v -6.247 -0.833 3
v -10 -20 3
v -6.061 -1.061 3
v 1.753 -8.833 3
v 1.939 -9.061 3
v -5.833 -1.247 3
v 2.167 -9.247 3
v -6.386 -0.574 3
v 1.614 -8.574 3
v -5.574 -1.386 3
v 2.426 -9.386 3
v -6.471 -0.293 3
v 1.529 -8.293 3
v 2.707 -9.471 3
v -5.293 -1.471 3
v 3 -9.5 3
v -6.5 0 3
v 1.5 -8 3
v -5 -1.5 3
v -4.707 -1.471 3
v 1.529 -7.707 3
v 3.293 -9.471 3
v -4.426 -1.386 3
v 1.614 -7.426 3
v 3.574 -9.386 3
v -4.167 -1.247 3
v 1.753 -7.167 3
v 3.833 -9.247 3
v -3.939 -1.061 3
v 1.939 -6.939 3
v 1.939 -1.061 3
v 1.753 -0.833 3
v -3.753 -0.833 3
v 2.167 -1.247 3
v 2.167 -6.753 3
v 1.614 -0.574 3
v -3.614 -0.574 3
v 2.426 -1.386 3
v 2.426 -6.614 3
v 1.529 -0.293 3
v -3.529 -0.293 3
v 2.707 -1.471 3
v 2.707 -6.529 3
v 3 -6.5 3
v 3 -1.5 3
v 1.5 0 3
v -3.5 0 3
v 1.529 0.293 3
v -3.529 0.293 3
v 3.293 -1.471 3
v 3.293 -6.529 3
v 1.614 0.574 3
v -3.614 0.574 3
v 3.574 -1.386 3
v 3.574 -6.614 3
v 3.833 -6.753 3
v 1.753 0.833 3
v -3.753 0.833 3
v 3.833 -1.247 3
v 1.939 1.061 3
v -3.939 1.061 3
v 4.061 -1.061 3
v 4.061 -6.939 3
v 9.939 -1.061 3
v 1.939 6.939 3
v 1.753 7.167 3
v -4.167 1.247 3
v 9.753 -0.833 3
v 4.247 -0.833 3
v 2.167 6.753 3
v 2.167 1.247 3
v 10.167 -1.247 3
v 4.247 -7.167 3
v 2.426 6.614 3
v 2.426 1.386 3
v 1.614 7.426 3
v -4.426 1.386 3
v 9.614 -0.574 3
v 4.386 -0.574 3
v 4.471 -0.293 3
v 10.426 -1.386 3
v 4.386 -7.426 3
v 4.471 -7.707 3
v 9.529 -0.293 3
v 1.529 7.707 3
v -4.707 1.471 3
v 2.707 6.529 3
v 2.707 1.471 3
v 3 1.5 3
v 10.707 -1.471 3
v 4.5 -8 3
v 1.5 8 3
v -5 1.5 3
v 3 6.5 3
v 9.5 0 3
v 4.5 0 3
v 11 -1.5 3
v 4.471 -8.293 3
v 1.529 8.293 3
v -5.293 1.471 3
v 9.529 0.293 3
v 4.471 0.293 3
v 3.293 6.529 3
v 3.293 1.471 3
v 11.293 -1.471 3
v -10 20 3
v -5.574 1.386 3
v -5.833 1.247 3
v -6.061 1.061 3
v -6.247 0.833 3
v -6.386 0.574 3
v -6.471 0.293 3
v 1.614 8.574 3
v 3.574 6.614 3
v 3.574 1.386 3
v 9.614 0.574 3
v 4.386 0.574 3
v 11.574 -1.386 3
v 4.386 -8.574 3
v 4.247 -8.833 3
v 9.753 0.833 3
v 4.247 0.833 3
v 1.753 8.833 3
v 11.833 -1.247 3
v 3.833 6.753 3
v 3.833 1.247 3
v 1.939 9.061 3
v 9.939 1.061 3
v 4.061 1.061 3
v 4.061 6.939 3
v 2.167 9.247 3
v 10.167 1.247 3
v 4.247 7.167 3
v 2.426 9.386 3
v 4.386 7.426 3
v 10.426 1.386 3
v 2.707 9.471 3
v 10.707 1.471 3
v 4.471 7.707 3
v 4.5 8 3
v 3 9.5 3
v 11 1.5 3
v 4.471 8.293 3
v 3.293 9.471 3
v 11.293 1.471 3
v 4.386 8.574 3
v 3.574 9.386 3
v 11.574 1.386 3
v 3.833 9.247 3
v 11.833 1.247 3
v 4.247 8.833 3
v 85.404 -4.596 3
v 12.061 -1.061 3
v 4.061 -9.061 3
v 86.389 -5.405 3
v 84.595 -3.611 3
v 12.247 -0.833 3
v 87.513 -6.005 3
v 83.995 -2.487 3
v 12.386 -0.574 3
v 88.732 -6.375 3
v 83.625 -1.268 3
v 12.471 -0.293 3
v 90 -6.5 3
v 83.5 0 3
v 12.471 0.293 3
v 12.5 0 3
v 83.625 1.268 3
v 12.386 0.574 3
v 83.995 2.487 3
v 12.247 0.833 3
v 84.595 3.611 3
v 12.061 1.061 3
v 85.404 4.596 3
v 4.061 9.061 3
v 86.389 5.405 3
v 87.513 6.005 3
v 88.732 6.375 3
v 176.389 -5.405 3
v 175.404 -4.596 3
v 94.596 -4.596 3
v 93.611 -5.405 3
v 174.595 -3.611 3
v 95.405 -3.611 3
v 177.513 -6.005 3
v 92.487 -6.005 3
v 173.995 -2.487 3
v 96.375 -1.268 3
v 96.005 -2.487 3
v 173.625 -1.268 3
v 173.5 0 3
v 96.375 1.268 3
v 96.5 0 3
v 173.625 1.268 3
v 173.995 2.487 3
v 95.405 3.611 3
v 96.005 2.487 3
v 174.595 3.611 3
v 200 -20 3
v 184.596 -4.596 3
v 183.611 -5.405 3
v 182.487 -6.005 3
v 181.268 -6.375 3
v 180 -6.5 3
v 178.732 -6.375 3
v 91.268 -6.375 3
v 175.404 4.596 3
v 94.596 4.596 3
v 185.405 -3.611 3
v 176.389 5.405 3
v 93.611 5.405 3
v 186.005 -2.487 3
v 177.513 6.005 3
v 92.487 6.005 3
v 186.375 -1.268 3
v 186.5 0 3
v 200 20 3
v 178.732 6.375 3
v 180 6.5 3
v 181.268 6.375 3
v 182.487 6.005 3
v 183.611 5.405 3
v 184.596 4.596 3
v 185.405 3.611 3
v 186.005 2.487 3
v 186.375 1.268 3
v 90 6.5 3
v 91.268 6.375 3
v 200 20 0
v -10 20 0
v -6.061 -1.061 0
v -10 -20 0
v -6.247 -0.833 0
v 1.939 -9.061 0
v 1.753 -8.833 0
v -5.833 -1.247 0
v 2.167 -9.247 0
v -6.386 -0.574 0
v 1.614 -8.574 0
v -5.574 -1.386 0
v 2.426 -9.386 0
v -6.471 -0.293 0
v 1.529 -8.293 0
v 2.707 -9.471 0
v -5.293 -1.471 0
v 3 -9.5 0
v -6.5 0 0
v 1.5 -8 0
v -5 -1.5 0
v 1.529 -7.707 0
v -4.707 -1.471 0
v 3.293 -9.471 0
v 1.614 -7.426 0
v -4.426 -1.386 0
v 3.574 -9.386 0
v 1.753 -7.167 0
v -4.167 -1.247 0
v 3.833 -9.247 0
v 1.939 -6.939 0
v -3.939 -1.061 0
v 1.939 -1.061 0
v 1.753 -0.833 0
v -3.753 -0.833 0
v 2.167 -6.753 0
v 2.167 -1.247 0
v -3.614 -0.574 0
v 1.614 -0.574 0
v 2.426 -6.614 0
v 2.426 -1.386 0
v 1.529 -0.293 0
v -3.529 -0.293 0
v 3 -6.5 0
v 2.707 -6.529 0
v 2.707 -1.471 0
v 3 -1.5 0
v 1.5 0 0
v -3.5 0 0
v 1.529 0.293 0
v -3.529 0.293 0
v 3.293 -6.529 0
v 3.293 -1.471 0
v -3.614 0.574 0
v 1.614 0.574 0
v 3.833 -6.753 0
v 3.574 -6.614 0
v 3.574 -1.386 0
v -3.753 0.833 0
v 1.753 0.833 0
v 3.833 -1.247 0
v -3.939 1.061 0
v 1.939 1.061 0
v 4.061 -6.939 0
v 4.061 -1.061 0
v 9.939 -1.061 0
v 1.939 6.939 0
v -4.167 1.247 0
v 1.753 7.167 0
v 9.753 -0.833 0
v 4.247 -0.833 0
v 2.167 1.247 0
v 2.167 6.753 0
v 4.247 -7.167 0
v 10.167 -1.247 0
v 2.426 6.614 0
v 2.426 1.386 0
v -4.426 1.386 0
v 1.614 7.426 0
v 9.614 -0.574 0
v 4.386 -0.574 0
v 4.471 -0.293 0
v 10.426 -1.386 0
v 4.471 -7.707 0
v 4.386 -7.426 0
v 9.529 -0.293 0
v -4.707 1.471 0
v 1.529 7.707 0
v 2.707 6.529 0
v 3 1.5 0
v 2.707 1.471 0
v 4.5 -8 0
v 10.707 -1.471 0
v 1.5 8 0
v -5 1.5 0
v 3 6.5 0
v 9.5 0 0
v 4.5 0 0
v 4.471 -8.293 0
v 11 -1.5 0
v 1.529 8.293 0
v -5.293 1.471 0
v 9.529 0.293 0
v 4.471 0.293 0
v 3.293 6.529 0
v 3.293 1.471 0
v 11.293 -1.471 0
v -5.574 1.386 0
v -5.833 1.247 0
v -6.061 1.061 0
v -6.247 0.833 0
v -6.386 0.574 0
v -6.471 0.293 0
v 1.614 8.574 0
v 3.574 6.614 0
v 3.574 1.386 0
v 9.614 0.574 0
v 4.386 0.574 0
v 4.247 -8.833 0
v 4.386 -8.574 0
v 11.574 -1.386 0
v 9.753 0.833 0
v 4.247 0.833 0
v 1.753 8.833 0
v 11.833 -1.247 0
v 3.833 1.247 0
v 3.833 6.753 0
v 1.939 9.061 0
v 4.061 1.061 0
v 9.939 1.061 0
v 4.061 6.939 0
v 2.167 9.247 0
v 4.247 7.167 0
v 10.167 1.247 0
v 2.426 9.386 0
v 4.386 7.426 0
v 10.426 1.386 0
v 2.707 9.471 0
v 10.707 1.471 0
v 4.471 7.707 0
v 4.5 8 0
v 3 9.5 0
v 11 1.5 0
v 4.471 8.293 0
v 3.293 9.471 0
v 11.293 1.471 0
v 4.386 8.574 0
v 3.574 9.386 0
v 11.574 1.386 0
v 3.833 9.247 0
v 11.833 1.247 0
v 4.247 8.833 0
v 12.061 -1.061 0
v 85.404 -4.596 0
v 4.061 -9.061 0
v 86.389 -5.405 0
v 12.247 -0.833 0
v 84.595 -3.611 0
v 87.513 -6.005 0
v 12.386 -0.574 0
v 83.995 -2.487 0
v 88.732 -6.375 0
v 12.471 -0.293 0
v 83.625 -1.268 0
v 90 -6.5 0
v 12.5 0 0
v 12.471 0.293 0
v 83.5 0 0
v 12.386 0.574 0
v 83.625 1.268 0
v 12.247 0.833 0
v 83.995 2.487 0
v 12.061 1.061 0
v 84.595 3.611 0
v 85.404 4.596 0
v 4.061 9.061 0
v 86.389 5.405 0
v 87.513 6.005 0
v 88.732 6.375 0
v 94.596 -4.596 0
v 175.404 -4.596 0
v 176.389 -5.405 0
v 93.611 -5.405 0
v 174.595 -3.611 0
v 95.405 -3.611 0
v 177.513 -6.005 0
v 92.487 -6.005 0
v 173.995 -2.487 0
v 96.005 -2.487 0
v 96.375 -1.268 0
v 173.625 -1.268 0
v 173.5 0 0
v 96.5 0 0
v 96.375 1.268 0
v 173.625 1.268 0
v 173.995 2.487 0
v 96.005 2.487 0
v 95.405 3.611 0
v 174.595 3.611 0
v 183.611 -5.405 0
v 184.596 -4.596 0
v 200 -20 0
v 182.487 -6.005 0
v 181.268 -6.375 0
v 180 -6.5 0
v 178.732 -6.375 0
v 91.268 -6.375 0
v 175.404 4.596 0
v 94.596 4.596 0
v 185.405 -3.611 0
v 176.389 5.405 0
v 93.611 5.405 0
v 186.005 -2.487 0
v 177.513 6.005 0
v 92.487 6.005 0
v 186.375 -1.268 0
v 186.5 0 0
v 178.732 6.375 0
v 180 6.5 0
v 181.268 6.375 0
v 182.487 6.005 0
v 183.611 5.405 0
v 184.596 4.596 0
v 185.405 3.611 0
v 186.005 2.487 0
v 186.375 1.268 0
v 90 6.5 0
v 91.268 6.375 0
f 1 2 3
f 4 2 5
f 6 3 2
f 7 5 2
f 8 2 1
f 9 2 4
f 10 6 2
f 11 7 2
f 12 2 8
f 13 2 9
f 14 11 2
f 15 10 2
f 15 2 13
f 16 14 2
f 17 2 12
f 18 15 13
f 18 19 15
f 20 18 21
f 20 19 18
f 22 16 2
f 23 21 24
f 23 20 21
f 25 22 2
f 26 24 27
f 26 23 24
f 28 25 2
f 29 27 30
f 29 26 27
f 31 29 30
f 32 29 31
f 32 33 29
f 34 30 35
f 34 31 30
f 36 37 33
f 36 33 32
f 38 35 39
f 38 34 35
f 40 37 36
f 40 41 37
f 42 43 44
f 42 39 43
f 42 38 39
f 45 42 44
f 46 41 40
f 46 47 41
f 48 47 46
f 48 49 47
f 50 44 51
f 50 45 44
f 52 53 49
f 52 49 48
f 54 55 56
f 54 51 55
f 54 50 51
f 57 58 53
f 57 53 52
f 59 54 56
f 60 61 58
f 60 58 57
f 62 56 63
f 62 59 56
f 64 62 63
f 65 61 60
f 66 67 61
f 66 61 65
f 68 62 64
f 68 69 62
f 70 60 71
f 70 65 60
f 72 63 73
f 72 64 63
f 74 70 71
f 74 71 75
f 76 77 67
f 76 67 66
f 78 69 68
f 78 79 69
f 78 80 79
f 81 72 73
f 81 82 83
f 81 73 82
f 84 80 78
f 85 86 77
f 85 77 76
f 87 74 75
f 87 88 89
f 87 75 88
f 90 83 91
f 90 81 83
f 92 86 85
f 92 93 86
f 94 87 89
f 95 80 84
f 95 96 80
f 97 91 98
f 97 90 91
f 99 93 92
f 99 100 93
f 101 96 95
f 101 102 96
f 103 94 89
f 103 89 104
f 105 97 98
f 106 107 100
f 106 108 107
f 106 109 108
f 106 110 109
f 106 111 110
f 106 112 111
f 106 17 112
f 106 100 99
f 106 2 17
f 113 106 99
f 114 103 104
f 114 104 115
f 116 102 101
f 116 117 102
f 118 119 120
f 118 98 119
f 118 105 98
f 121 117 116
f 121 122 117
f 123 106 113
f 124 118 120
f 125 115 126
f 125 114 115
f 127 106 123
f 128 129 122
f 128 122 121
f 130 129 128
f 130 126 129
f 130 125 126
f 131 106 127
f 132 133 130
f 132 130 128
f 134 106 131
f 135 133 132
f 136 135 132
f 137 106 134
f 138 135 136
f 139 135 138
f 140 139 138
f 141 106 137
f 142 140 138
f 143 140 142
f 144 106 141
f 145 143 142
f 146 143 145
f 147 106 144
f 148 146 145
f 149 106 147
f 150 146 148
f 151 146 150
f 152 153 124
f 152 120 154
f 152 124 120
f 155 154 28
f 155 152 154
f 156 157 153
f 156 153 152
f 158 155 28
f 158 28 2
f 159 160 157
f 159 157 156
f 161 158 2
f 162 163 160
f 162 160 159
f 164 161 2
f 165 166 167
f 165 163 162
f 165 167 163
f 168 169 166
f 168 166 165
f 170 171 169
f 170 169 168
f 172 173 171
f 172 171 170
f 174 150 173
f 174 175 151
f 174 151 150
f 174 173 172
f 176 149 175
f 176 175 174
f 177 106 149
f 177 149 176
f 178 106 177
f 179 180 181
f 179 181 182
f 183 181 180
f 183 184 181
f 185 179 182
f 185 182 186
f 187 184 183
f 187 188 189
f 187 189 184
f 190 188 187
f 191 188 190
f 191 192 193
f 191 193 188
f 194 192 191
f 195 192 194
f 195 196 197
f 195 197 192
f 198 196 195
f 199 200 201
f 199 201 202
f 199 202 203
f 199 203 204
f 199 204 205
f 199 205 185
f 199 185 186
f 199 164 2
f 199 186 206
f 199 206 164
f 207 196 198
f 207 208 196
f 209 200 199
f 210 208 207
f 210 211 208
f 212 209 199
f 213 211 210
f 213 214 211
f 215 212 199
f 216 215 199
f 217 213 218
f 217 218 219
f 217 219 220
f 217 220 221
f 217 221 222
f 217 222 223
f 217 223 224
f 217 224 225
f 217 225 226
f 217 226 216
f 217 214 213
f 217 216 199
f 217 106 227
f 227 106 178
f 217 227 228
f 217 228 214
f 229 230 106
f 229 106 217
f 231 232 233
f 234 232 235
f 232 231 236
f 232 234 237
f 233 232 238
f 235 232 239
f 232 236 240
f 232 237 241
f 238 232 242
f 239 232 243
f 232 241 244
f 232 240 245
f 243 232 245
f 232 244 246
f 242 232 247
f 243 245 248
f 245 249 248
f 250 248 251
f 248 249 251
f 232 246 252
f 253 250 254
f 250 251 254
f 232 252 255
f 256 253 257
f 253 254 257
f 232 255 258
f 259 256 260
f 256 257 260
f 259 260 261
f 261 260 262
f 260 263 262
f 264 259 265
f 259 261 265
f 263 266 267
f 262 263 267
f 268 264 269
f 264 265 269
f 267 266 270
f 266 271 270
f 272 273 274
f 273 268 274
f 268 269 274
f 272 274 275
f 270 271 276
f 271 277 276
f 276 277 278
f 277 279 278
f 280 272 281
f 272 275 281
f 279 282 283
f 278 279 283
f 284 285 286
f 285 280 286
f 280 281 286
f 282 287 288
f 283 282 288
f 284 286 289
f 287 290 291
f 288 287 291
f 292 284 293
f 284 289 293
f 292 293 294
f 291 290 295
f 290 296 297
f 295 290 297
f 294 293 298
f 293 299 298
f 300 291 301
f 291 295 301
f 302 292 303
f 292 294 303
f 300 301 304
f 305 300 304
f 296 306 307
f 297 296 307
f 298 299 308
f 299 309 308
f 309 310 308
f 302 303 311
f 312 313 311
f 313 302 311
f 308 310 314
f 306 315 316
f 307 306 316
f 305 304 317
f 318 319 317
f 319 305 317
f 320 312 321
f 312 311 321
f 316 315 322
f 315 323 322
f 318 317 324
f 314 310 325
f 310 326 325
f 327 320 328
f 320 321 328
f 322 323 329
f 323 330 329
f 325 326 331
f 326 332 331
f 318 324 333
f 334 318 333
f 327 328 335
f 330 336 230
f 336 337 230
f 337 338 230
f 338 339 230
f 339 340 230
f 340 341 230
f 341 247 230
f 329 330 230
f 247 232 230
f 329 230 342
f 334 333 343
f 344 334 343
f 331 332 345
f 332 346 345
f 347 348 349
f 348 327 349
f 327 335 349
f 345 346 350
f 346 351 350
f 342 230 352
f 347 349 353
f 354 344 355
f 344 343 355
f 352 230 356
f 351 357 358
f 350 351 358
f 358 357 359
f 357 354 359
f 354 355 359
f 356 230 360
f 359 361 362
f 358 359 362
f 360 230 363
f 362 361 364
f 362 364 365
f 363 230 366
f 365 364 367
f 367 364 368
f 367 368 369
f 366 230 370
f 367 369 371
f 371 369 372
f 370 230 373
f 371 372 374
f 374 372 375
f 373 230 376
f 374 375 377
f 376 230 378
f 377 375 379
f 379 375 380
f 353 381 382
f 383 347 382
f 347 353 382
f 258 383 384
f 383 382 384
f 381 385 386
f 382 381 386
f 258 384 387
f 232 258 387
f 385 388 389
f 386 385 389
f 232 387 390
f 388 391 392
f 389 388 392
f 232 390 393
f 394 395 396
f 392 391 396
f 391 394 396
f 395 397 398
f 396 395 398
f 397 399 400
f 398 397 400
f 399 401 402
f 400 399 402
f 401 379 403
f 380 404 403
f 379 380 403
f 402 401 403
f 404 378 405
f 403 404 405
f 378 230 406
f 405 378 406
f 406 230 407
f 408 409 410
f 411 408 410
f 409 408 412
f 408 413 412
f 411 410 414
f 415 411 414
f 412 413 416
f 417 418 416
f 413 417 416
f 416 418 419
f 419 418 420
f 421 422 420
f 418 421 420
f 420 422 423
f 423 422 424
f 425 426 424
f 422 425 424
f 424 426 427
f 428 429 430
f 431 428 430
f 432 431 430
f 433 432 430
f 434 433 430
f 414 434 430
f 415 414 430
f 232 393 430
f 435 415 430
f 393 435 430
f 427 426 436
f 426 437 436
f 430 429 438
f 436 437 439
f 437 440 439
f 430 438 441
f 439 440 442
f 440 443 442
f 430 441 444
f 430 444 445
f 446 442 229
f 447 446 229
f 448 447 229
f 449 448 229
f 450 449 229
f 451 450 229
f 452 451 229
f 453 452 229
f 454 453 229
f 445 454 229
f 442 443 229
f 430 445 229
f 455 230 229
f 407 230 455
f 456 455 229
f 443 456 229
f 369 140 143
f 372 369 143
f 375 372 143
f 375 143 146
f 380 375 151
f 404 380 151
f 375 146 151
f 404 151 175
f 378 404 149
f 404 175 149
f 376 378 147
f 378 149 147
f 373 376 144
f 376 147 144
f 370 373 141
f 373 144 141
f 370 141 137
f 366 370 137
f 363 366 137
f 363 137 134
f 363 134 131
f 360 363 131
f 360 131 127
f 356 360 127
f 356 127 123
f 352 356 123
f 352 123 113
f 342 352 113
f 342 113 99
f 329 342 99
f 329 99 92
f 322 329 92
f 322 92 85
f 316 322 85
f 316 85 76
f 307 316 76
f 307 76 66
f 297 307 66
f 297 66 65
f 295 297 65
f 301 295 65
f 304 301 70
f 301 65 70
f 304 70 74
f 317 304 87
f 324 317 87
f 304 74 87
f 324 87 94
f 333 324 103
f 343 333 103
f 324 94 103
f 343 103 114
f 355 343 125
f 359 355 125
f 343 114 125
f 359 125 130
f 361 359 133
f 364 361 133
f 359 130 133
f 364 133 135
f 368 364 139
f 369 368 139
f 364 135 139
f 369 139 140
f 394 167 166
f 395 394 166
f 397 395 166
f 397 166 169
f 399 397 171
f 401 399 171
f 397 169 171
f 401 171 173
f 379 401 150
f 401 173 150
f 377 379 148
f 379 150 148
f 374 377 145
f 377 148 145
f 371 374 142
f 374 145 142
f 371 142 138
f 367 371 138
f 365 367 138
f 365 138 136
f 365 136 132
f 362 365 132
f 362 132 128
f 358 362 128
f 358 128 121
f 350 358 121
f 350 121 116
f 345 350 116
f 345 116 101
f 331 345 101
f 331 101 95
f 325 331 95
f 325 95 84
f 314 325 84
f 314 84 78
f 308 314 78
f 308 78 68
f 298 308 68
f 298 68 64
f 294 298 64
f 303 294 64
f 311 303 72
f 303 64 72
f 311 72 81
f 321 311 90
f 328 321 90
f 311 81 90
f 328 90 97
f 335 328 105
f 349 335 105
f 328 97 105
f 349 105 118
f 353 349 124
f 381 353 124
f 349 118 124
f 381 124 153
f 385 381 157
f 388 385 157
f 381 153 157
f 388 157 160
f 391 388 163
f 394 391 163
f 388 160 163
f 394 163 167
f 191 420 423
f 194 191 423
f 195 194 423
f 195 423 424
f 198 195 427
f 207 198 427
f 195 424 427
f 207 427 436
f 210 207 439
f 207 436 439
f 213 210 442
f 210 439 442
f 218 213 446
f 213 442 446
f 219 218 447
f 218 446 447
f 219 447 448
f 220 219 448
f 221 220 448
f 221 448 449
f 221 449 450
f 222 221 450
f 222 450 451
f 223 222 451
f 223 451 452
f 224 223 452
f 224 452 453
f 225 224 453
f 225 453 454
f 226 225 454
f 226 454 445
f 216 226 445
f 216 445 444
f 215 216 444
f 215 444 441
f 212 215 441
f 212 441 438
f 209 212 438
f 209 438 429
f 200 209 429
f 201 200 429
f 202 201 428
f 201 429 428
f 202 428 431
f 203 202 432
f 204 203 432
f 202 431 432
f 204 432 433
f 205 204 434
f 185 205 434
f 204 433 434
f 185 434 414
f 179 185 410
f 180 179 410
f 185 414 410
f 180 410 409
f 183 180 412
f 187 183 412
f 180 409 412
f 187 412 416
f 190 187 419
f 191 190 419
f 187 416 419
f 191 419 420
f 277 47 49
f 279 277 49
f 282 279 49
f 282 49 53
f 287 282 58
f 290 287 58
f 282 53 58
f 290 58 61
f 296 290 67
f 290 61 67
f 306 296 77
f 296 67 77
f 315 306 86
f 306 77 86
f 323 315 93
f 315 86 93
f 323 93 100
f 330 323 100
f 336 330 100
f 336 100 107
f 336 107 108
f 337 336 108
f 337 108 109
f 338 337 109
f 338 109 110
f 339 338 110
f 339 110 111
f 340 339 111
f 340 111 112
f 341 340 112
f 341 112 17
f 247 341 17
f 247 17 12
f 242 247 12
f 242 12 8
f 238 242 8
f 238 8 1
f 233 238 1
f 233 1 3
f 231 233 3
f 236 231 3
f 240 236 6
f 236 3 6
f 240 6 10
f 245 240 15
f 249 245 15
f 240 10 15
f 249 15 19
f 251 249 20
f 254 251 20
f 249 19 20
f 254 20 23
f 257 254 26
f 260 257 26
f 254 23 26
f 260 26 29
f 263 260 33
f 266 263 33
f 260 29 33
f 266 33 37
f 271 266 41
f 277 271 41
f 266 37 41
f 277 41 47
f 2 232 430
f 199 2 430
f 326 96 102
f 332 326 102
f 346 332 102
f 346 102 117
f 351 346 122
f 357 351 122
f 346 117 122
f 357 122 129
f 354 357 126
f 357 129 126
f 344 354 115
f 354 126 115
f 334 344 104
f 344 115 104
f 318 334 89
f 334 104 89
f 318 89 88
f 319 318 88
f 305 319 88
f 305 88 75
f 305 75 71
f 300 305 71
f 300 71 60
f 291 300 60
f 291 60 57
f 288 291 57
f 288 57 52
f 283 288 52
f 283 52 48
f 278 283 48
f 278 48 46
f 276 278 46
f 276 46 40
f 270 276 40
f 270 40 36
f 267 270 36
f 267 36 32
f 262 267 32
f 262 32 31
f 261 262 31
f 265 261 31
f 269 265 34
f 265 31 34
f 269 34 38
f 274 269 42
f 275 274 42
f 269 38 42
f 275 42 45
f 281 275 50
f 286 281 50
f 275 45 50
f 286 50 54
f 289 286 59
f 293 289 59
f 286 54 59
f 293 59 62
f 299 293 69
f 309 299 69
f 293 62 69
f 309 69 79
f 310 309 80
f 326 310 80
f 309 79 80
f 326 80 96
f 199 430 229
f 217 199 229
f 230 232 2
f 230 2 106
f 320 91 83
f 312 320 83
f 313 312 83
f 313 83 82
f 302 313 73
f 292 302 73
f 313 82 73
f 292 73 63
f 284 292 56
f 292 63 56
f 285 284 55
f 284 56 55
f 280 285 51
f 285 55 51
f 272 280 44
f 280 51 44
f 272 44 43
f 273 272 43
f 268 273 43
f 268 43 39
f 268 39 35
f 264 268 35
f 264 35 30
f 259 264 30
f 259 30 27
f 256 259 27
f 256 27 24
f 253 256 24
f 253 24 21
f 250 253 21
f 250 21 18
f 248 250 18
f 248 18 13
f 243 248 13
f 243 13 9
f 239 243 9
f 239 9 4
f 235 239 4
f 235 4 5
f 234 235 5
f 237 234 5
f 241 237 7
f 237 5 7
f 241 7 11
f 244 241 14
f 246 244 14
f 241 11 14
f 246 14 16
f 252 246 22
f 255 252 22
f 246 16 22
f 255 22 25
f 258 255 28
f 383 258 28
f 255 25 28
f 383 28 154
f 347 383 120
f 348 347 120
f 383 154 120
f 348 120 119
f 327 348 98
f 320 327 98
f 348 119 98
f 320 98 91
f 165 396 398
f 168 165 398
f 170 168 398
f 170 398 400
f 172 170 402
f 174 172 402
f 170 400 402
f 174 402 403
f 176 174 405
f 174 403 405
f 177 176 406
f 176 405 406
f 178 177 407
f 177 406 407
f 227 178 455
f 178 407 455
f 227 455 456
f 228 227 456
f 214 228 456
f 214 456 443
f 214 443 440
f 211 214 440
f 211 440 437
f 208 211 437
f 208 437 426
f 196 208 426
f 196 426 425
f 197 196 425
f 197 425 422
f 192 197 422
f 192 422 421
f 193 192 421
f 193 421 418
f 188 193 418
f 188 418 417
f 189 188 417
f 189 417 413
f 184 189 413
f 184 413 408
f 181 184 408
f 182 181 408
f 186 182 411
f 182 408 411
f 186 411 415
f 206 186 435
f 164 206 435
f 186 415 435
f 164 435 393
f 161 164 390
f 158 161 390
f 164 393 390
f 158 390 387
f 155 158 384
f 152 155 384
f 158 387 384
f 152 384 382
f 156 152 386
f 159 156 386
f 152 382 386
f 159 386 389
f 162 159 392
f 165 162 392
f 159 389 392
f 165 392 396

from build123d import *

# Parameters (mm, degrees)
SKETCH1_W                  = 210
SKETCH1_H                  = 40
BOSS_EXTRUDE1_DEPTH        = 3
F_3_0_3_DIAMETER_HOLE2_D   = 3
F_13_0_13_DIAMETER_HOLE1_D = 13


with BuildPart() as part:
    # Sketch1 → Boss-Extrude1 (new body)
    with BuildSketch(Plane.XY):
        with Locations((95, 0)):
            Rectangle(SKETCH1_W, SKETCH1_H)
    extrude(amount=BOSS_EXTRUDE1_DEPTH)

    # Ø3.0 (3) Diameter Hole2 (through all)
    with Locations(Plane(origin=(0, 0, 0), x_dir=(-1, 0, 0), z_dir=(0, 0, -1))):
        with Locations((-3, 8), (-11, 0), (5, 0), (-3, -8), (-3, 0)):
            Hole(F_3_0_3_DIAMETER_HOLE2_D / 2)

    # Ø13.0 (13) Diameter Hole1 (through all)
    with Locations(Plane.XY.offset(3)):
        with Locations((90, 0), (180, 0)):
            Hole(F_13_0_13_DIAMETER_HOLE1_D / 2)


solid = part.part
